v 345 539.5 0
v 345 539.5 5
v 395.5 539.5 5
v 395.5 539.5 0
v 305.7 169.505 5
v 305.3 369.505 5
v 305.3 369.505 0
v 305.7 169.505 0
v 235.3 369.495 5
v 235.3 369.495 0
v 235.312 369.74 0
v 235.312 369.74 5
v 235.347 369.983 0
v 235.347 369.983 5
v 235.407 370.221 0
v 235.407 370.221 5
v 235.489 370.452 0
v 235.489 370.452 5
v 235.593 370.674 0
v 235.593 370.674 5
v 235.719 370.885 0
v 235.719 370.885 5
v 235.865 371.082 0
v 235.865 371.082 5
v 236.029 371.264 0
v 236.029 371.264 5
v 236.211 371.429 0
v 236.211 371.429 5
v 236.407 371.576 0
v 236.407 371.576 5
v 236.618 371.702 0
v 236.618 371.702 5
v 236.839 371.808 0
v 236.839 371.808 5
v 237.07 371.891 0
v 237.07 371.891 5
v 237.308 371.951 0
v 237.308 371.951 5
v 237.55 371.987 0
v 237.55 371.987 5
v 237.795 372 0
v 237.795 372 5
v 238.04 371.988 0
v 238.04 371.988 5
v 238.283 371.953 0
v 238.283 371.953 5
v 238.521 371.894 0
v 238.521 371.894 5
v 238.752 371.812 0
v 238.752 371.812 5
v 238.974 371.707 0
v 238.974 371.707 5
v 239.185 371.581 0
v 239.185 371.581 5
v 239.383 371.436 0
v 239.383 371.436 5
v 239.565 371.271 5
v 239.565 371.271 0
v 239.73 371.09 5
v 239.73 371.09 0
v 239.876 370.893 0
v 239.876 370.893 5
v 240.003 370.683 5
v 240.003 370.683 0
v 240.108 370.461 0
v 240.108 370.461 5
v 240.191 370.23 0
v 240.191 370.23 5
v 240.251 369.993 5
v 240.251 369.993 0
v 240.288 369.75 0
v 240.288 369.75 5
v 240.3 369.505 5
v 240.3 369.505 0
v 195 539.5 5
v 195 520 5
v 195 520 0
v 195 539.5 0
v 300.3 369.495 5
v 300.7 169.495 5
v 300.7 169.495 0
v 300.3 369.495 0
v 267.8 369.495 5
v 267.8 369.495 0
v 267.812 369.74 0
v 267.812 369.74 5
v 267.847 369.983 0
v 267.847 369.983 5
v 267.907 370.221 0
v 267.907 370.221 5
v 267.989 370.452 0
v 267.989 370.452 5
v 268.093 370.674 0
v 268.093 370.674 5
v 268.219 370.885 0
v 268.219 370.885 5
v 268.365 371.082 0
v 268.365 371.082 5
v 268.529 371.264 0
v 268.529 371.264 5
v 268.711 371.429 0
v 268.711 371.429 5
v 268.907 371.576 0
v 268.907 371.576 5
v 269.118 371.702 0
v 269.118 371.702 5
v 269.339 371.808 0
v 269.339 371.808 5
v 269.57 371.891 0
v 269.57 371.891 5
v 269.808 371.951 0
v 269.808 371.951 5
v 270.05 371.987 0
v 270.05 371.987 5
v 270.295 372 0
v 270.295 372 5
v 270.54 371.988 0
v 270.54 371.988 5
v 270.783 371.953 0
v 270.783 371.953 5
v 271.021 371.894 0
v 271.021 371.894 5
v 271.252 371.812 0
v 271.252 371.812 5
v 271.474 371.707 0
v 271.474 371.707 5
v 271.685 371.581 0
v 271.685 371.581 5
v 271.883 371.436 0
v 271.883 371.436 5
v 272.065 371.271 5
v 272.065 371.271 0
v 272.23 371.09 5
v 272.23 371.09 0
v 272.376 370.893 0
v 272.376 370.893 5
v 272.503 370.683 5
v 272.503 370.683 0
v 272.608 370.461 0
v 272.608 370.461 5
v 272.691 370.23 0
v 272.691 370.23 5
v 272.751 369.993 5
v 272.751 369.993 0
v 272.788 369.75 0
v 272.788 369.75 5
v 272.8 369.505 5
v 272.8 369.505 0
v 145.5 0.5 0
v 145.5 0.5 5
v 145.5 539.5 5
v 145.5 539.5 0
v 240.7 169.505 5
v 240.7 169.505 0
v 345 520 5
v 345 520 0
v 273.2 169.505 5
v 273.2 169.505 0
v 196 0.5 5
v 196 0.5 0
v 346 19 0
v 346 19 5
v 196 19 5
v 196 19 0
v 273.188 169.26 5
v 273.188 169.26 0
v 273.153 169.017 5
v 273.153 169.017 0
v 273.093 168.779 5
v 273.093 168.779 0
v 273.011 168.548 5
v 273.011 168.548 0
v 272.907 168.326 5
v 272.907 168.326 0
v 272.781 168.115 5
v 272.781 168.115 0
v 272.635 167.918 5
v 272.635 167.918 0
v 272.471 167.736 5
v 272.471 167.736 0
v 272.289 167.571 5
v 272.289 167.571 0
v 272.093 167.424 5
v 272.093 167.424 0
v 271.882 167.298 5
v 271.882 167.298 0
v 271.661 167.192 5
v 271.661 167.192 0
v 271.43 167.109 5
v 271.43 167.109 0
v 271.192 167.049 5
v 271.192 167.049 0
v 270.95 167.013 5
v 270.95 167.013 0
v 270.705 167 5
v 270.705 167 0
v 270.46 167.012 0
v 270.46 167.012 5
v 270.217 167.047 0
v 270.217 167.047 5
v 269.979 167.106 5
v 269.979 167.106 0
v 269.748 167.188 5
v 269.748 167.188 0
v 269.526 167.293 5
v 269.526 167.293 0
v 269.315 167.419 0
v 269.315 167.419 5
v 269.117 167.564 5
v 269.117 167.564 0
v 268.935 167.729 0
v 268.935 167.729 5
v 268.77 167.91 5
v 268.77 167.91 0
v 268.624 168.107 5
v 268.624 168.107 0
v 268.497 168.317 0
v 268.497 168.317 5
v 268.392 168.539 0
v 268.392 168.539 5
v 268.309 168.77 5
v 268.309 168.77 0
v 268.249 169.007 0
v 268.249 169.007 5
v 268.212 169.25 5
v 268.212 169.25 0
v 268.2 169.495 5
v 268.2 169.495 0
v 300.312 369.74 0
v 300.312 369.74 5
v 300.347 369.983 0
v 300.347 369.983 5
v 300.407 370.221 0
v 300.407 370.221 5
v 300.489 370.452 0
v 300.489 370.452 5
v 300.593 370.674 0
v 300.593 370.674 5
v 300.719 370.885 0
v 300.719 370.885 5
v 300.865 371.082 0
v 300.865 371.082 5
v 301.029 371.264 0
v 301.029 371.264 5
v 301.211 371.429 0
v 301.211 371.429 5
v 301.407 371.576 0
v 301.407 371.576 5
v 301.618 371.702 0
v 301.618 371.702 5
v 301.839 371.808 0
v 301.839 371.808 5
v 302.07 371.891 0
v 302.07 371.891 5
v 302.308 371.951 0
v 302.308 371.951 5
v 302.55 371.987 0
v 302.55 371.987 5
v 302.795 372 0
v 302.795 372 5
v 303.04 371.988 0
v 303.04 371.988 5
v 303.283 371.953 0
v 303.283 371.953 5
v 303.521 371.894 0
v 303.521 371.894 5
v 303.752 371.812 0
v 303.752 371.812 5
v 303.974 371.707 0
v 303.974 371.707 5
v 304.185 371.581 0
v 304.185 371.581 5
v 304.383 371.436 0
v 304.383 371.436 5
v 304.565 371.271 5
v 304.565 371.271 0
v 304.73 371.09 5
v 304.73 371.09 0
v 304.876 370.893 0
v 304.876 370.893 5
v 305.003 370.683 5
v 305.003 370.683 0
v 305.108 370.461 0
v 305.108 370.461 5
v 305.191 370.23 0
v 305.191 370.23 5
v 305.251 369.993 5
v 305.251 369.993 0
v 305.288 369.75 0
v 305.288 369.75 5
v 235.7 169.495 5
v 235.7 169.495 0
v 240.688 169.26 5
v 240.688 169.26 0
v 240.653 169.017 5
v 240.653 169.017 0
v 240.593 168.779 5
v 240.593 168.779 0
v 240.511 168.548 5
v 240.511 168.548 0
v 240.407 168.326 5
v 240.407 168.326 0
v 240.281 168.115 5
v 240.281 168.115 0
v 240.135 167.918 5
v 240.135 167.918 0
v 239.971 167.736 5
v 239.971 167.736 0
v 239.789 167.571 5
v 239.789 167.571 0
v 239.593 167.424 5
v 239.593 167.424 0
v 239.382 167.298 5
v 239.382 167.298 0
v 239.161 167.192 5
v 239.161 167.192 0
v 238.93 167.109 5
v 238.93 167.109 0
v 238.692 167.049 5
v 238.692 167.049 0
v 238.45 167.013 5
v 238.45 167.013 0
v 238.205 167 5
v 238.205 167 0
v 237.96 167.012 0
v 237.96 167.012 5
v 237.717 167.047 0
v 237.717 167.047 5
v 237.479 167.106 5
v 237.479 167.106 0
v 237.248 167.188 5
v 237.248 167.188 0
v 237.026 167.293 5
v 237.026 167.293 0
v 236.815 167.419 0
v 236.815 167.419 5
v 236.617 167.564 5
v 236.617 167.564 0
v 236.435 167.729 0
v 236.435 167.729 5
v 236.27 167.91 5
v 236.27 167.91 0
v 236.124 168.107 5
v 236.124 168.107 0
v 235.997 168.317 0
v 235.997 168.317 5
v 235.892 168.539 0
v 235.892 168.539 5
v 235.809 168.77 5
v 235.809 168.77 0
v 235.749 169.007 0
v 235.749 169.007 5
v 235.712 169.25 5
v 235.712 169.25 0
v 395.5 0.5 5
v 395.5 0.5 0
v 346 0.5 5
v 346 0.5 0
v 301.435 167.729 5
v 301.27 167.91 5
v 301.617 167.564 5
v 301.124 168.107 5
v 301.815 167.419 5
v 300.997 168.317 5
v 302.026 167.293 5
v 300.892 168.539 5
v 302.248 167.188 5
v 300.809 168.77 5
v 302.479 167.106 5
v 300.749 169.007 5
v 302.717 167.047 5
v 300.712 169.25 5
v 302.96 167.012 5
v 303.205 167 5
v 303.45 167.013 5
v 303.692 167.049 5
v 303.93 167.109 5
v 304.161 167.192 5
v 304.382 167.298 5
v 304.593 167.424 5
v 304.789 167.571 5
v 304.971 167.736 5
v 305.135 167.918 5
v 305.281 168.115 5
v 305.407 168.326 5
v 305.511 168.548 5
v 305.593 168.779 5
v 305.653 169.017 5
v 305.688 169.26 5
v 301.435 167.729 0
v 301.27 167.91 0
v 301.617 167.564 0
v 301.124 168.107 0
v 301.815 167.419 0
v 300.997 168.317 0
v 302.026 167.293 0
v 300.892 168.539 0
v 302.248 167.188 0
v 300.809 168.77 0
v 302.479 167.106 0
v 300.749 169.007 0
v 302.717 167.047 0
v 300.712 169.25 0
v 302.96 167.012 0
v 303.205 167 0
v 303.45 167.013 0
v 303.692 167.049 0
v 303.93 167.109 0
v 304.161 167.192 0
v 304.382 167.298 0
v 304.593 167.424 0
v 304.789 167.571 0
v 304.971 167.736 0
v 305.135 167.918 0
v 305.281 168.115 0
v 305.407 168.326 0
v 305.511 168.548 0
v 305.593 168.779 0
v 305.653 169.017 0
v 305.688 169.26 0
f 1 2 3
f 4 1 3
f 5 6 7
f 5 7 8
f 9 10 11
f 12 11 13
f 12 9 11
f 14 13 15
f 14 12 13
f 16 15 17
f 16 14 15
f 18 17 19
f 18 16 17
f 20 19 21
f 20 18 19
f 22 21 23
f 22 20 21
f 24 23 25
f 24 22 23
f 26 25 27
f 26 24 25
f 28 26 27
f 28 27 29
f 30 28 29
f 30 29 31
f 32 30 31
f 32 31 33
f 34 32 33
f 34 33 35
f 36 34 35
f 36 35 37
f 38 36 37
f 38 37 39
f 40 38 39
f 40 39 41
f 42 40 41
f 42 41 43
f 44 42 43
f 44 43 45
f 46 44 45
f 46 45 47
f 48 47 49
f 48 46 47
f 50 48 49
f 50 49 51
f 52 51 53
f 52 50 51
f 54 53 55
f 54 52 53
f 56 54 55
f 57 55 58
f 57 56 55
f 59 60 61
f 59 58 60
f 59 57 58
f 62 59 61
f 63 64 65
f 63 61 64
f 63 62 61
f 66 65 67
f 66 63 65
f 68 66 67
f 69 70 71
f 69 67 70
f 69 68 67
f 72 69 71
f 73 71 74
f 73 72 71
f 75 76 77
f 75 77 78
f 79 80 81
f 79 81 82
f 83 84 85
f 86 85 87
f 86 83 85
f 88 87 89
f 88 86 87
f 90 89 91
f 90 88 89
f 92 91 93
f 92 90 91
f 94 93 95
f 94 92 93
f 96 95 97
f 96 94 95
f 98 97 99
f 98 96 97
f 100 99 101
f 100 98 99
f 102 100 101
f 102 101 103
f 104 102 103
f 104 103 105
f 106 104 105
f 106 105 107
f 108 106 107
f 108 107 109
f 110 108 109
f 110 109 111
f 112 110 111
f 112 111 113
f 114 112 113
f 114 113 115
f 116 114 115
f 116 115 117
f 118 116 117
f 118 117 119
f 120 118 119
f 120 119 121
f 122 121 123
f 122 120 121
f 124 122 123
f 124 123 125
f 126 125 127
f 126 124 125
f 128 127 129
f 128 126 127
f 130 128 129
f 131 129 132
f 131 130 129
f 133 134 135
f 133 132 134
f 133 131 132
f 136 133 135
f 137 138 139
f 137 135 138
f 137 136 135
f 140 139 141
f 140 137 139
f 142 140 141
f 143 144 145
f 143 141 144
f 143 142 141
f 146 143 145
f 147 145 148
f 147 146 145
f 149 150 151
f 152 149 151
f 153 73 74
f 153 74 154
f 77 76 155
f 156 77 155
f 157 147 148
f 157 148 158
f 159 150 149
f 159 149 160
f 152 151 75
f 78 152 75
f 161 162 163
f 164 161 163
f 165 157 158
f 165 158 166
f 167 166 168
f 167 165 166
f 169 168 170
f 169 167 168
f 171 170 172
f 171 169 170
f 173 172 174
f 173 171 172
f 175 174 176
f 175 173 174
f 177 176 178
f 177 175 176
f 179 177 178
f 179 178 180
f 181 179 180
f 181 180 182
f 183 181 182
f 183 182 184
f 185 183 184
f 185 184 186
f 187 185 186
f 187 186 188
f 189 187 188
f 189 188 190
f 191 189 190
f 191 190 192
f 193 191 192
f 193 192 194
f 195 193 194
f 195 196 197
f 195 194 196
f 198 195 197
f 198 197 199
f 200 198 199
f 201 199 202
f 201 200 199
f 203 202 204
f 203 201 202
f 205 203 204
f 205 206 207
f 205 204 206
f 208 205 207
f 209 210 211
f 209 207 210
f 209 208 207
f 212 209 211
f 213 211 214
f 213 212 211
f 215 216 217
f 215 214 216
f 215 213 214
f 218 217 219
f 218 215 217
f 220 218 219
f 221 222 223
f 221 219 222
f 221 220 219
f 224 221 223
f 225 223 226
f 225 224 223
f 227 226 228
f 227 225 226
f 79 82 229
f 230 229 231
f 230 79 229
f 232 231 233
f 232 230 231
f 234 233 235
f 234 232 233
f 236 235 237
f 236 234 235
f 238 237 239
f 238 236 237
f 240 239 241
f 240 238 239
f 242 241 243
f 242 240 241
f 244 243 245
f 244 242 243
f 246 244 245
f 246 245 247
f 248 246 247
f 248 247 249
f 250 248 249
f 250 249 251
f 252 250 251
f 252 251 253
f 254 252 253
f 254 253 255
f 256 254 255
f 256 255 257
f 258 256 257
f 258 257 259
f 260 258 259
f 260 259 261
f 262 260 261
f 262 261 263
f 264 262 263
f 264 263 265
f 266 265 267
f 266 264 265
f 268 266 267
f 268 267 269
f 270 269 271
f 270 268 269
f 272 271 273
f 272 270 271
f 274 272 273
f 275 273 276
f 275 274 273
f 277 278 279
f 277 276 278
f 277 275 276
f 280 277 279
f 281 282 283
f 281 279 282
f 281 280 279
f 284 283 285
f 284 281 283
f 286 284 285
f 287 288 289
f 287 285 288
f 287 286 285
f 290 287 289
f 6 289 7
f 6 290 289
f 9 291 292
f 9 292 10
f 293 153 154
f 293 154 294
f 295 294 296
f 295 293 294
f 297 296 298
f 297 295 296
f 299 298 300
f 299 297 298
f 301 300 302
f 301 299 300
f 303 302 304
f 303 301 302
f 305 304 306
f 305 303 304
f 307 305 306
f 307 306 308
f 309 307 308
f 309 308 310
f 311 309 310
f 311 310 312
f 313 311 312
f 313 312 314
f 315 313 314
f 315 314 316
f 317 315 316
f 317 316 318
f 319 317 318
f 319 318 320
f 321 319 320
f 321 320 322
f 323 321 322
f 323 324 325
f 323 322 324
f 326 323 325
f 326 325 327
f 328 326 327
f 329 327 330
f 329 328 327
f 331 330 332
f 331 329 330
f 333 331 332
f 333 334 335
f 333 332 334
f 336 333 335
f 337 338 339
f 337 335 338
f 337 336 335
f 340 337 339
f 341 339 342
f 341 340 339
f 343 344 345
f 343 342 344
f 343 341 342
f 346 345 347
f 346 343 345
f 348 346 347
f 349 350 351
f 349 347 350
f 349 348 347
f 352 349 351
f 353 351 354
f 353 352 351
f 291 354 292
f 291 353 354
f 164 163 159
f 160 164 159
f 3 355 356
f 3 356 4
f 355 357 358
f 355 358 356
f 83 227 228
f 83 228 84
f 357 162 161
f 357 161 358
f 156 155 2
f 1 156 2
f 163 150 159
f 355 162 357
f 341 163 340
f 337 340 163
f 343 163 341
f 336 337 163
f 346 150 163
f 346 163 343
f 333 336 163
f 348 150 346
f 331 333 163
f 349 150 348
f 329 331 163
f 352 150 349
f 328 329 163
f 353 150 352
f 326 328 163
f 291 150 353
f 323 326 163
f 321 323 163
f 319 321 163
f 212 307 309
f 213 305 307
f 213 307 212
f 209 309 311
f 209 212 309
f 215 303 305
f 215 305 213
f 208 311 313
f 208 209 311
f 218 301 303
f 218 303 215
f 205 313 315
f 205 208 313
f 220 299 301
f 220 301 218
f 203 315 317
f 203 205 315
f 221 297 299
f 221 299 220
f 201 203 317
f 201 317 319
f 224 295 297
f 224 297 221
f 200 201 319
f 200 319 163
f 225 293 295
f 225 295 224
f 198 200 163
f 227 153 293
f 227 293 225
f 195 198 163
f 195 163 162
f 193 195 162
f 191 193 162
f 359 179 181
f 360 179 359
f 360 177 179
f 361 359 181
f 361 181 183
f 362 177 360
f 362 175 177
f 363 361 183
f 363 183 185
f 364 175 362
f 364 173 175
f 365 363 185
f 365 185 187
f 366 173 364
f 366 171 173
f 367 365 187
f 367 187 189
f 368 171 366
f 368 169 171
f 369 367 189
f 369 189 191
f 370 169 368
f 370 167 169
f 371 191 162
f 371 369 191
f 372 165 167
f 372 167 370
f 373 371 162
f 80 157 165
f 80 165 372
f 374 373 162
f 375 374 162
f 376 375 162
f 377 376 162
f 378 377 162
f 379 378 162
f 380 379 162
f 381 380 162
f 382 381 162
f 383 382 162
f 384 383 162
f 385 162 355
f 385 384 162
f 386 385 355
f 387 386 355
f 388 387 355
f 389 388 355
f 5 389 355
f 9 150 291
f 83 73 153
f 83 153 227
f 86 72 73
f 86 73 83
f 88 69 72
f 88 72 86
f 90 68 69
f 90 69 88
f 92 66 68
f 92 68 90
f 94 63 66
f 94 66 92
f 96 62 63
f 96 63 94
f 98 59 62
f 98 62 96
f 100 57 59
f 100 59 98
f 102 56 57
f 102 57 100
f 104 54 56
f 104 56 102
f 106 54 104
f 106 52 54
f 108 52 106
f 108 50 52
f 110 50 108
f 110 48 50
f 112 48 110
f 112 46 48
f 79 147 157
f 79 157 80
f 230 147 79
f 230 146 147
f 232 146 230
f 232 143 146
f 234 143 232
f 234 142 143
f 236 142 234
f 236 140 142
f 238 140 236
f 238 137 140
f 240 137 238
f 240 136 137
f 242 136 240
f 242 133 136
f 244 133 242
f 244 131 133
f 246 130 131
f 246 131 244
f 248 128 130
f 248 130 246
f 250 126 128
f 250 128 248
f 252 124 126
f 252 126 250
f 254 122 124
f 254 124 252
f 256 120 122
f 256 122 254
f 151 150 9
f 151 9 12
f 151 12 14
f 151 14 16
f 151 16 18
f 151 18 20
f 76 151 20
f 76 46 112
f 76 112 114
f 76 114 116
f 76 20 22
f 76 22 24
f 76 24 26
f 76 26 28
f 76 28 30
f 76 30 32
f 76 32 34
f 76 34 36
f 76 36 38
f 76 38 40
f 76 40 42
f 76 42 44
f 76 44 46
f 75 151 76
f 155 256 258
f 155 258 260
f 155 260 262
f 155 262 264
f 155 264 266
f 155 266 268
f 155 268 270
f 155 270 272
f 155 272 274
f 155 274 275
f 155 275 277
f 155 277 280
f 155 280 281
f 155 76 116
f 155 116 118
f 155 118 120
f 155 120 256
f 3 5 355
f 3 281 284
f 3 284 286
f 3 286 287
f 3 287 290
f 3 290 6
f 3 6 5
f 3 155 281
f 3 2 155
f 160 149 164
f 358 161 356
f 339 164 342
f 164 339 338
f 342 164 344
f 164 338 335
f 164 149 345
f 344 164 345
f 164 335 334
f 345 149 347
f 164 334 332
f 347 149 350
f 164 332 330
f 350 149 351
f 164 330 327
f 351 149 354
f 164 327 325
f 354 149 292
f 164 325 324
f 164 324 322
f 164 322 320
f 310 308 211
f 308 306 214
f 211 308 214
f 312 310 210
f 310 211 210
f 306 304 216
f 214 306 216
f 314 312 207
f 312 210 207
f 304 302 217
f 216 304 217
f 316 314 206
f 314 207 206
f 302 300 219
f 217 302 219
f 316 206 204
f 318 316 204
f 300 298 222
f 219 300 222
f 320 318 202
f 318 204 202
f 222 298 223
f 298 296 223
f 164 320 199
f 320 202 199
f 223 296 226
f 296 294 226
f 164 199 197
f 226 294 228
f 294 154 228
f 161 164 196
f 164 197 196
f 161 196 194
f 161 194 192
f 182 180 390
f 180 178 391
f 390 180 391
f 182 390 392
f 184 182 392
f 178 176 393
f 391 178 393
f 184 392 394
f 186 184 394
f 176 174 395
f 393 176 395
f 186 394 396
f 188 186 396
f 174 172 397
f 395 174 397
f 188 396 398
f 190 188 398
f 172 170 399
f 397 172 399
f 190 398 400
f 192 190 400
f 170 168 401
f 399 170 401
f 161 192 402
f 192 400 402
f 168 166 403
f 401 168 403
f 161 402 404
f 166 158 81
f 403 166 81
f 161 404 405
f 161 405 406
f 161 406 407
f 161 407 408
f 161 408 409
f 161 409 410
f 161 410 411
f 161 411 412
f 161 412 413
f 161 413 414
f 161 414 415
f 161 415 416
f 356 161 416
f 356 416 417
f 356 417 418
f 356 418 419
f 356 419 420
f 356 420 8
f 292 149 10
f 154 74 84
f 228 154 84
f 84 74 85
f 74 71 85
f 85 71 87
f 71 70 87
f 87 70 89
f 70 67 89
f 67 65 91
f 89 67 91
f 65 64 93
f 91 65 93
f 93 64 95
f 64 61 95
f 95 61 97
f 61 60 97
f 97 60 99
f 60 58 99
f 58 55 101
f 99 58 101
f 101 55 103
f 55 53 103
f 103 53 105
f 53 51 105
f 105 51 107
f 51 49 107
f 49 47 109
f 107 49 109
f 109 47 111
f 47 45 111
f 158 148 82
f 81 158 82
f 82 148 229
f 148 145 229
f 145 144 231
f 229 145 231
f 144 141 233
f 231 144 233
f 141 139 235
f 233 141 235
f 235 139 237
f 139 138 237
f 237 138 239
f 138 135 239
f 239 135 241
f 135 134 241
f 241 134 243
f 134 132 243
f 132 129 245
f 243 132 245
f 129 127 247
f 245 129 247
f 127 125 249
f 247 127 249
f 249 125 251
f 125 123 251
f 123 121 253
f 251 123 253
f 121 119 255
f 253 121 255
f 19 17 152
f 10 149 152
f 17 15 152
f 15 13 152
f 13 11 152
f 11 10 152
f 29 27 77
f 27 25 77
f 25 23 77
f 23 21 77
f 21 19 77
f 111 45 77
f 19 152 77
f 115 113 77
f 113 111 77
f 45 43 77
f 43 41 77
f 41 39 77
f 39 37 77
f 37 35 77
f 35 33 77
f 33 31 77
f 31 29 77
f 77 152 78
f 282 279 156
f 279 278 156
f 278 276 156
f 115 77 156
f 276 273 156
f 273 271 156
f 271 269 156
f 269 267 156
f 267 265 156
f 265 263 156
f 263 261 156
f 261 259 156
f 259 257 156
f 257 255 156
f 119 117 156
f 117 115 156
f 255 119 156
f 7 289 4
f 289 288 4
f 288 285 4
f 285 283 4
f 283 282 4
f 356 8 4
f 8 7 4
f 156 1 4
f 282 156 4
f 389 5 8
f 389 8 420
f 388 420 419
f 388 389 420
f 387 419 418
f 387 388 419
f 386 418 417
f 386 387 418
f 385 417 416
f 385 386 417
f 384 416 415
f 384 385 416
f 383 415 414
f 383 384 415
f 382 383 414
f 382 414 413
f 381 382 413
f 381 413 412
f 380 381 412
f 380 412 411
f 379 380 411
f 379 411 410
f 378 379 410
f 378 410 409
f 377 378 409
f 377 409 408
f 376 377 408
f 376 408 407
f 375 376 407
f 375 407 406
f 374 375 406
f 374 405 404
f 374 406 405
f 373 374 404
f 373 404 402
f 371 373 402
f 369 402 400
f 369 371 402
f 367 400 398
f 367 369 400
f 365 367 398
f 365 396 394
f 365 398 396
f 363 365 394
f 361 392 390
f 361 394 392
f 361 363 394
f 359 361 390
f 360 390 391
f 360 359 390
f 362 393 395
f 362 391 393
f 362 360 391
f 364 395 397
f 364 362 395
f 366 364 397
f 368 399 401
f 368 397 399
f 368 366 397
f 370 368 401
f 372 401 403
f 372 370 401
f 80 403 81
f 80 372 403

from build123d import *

# Parameters (mm, degrees)
SKETCH1_W           = 540
SKETCH1_H           = 540
BOSS_EXTRUDE1_DEPTH = 5
CHAMFER2_SIZE       = 0.5
CHAMFER3_SIZE       = 2
SKETCH3_W           = 150
SKETCH3_H           = 20
CUT_EXTRUDE2_DEPTH  = 10
CIRPATTERN1_COUNT   = 4
CUT_EXTRUDE3_DEPTH  = 10
LPATTERN1_COUNT     = 2
LPATTERN1_PITCH     = 32.5
LPATTERN2_COUNT     = 2
LPATTERN2_PITCH     = 32.5
SKETCH7_W           = 697.267045649
SKETCH7_H           = 709.774077858
SKETCH7_W_2         = 250
SKETCH7_H_2         = 539
CUT_EXTRUDE4_DEPTH  = 764.691691719


with BuildPart() as part:
    # Sketch1 → Boss-Extrude1 (new body)
    with BuildSketch(Plane.XY):
        with Locations((270, 270)):
            Rectangle(SKETCH1_W, SKETCH1_H)
    extrude(amount=BOSS_EXTRUDE1_DEPTH)

    # Chamfer2
    chamfer2_edges = [part.edges().sort_by_distance(p)[0] for p in [
        (540, 270, 5),
        (270, 540, 5),
        (0, 270, 5),
        (270, 540, 0),
        (540, 270, 0),
        (270, 0, 0),
        (0, 270, 0),
        (270, 0, 5),
    ]]
    chamfer(chamfer2_edges, length=CHAMFER2_SIZE)

    # Chamfer3
    # the kernel refuses this chamfer: 2 mm, written as the material it takes off along each edge
    with BuildSketch(Plane(origin=(0, 540, -4.643365976), x_dir=(-0.027495876610586483, -0.9996219169112968, 0), z_dir=(0, 0, 1)), Plane(origin=(0, 0, -4.643365976), x_dir=(0.9996219169112968, -0.027495876610586372, 0), z_dir=(0, 0, 1))) as chamfer3_piece_1:
        Polygon((CHAMFER3_SIZE * 0.999621916911, CHAMFER3_SIZE * 0.0274958766106), (-CHAMFER3_SIZE * 0.0274958766106, CHAMFER3_SIZE * 0.999621916911), (0, 0), align=None)
    extrude(amount=14.286731952, mode=Mode.SUBTRACT)
    with BuildSketch(Plane(origin=(540, 540, -4.643365976), x_dir=(0.02749587661058229, -0.9996219169112968, 0), z_dir=(0, 0, 1)), Plane(origin=(540, 0, -4.643365976), x_dir=(-0.9996219169112968, -0.027495876610586483, 0), z_dir=(0, 0, 1))) as chamfer3_piece_2:
        Polygon((CHAMFER3_SIZE * 0.999621916911, -CHAMFER3_SIZE * 0.0274958766106), (-CHAMFER3_SIZE * 0.0274958766106, -CHAMFER3_SIZE * 0.999621916911), (0, 0), align=None)
    extrude(amount=14.286731952, mode=Mode.SUBTRACT)

    # Sketch3 → Cut-Extrude2 (cut)
    with BuildSketch(Plane.XY.offset(5)):
        with Locations((270, 530)):
            Rectangle(SKETCH3_W, SKETCH3_H)
    cut_extrude2 = extrude(amount=-CUT_EXTRUDE2_DEPTH, mode=Mode.SUBTRACT)

    # CirPattern1: Cut-Extrude2 ×4 about axis
    cirpattern1_axis = Axis((270.5, 269.5, 0), (0, 0, 1))
    for i in range(1, CIRPATTERN1_COUNT):
        add(cut_extrude2.rotate(cirpattern1_axis, i * 360 / CIRPATTERN1_COUNT), mode=Mode.SUBTRACT)

    # Sketch6 → Cut-Extrude3 (cut)
    with BuildSketch(Plane.XY.offset(5)):
        with BuildLine():
            Line((272.800394222, 369.50499001), (273.199595818, 169.50499001))
            ThreePointArc((273.199595818, 169.50499001), (270.704590808, 167.00000498), (268.199605778, 169.49500999))
            Line((268.199605778, 169.49500999), (267.800404182, 369.49500999))
            ThreePointArc((267.800404182, 369.49500999), (270.295409192, 371.99999502), (272.800394222, 369.50499001))
        make_face()
    cut_extrude3 = extrude(amount=-CUT_EXTRUDE3_DEPTH, mode=Mode.SUBTRACT)

    # LPattern1: Cut-Extrude3 ×2
    with Locations(*[(i * LPATTERN1_PITCH, 0, 0) for i in range(1, LPATTERN1_COUNT)]):
        add(cut_extrude3, mode=Mode.SUBTRACT)

    # LPattern2: Cut-Extrude3 ×2
    with Locations(*[(-i * LPATTERN2_PITCH, 0, 0) for i in range(1, LPATTERN2_COUNT)]):
        add(cut_extrude3, mode=Mode.SUBTRACT)

    # Sketch7 → Cut-Extrude4 (cut, through all)
    with BuildSketch(Plane.XY.offset(5)):
        with Locations((264.820460551, 266.911861518)):
            Rectangle(SKETCH7_W, SKETCH7_H)
        with Locations((270.5, 270)):
            Rectangle(SKETCH7_W_2, SKETCH7_H_2, mode=Mode.SUBTRACT)
    extrude(amount=-CUT_EXTRUDE4_DEPTH, mode=Mode.SUBTRACT)


solid = part.part
